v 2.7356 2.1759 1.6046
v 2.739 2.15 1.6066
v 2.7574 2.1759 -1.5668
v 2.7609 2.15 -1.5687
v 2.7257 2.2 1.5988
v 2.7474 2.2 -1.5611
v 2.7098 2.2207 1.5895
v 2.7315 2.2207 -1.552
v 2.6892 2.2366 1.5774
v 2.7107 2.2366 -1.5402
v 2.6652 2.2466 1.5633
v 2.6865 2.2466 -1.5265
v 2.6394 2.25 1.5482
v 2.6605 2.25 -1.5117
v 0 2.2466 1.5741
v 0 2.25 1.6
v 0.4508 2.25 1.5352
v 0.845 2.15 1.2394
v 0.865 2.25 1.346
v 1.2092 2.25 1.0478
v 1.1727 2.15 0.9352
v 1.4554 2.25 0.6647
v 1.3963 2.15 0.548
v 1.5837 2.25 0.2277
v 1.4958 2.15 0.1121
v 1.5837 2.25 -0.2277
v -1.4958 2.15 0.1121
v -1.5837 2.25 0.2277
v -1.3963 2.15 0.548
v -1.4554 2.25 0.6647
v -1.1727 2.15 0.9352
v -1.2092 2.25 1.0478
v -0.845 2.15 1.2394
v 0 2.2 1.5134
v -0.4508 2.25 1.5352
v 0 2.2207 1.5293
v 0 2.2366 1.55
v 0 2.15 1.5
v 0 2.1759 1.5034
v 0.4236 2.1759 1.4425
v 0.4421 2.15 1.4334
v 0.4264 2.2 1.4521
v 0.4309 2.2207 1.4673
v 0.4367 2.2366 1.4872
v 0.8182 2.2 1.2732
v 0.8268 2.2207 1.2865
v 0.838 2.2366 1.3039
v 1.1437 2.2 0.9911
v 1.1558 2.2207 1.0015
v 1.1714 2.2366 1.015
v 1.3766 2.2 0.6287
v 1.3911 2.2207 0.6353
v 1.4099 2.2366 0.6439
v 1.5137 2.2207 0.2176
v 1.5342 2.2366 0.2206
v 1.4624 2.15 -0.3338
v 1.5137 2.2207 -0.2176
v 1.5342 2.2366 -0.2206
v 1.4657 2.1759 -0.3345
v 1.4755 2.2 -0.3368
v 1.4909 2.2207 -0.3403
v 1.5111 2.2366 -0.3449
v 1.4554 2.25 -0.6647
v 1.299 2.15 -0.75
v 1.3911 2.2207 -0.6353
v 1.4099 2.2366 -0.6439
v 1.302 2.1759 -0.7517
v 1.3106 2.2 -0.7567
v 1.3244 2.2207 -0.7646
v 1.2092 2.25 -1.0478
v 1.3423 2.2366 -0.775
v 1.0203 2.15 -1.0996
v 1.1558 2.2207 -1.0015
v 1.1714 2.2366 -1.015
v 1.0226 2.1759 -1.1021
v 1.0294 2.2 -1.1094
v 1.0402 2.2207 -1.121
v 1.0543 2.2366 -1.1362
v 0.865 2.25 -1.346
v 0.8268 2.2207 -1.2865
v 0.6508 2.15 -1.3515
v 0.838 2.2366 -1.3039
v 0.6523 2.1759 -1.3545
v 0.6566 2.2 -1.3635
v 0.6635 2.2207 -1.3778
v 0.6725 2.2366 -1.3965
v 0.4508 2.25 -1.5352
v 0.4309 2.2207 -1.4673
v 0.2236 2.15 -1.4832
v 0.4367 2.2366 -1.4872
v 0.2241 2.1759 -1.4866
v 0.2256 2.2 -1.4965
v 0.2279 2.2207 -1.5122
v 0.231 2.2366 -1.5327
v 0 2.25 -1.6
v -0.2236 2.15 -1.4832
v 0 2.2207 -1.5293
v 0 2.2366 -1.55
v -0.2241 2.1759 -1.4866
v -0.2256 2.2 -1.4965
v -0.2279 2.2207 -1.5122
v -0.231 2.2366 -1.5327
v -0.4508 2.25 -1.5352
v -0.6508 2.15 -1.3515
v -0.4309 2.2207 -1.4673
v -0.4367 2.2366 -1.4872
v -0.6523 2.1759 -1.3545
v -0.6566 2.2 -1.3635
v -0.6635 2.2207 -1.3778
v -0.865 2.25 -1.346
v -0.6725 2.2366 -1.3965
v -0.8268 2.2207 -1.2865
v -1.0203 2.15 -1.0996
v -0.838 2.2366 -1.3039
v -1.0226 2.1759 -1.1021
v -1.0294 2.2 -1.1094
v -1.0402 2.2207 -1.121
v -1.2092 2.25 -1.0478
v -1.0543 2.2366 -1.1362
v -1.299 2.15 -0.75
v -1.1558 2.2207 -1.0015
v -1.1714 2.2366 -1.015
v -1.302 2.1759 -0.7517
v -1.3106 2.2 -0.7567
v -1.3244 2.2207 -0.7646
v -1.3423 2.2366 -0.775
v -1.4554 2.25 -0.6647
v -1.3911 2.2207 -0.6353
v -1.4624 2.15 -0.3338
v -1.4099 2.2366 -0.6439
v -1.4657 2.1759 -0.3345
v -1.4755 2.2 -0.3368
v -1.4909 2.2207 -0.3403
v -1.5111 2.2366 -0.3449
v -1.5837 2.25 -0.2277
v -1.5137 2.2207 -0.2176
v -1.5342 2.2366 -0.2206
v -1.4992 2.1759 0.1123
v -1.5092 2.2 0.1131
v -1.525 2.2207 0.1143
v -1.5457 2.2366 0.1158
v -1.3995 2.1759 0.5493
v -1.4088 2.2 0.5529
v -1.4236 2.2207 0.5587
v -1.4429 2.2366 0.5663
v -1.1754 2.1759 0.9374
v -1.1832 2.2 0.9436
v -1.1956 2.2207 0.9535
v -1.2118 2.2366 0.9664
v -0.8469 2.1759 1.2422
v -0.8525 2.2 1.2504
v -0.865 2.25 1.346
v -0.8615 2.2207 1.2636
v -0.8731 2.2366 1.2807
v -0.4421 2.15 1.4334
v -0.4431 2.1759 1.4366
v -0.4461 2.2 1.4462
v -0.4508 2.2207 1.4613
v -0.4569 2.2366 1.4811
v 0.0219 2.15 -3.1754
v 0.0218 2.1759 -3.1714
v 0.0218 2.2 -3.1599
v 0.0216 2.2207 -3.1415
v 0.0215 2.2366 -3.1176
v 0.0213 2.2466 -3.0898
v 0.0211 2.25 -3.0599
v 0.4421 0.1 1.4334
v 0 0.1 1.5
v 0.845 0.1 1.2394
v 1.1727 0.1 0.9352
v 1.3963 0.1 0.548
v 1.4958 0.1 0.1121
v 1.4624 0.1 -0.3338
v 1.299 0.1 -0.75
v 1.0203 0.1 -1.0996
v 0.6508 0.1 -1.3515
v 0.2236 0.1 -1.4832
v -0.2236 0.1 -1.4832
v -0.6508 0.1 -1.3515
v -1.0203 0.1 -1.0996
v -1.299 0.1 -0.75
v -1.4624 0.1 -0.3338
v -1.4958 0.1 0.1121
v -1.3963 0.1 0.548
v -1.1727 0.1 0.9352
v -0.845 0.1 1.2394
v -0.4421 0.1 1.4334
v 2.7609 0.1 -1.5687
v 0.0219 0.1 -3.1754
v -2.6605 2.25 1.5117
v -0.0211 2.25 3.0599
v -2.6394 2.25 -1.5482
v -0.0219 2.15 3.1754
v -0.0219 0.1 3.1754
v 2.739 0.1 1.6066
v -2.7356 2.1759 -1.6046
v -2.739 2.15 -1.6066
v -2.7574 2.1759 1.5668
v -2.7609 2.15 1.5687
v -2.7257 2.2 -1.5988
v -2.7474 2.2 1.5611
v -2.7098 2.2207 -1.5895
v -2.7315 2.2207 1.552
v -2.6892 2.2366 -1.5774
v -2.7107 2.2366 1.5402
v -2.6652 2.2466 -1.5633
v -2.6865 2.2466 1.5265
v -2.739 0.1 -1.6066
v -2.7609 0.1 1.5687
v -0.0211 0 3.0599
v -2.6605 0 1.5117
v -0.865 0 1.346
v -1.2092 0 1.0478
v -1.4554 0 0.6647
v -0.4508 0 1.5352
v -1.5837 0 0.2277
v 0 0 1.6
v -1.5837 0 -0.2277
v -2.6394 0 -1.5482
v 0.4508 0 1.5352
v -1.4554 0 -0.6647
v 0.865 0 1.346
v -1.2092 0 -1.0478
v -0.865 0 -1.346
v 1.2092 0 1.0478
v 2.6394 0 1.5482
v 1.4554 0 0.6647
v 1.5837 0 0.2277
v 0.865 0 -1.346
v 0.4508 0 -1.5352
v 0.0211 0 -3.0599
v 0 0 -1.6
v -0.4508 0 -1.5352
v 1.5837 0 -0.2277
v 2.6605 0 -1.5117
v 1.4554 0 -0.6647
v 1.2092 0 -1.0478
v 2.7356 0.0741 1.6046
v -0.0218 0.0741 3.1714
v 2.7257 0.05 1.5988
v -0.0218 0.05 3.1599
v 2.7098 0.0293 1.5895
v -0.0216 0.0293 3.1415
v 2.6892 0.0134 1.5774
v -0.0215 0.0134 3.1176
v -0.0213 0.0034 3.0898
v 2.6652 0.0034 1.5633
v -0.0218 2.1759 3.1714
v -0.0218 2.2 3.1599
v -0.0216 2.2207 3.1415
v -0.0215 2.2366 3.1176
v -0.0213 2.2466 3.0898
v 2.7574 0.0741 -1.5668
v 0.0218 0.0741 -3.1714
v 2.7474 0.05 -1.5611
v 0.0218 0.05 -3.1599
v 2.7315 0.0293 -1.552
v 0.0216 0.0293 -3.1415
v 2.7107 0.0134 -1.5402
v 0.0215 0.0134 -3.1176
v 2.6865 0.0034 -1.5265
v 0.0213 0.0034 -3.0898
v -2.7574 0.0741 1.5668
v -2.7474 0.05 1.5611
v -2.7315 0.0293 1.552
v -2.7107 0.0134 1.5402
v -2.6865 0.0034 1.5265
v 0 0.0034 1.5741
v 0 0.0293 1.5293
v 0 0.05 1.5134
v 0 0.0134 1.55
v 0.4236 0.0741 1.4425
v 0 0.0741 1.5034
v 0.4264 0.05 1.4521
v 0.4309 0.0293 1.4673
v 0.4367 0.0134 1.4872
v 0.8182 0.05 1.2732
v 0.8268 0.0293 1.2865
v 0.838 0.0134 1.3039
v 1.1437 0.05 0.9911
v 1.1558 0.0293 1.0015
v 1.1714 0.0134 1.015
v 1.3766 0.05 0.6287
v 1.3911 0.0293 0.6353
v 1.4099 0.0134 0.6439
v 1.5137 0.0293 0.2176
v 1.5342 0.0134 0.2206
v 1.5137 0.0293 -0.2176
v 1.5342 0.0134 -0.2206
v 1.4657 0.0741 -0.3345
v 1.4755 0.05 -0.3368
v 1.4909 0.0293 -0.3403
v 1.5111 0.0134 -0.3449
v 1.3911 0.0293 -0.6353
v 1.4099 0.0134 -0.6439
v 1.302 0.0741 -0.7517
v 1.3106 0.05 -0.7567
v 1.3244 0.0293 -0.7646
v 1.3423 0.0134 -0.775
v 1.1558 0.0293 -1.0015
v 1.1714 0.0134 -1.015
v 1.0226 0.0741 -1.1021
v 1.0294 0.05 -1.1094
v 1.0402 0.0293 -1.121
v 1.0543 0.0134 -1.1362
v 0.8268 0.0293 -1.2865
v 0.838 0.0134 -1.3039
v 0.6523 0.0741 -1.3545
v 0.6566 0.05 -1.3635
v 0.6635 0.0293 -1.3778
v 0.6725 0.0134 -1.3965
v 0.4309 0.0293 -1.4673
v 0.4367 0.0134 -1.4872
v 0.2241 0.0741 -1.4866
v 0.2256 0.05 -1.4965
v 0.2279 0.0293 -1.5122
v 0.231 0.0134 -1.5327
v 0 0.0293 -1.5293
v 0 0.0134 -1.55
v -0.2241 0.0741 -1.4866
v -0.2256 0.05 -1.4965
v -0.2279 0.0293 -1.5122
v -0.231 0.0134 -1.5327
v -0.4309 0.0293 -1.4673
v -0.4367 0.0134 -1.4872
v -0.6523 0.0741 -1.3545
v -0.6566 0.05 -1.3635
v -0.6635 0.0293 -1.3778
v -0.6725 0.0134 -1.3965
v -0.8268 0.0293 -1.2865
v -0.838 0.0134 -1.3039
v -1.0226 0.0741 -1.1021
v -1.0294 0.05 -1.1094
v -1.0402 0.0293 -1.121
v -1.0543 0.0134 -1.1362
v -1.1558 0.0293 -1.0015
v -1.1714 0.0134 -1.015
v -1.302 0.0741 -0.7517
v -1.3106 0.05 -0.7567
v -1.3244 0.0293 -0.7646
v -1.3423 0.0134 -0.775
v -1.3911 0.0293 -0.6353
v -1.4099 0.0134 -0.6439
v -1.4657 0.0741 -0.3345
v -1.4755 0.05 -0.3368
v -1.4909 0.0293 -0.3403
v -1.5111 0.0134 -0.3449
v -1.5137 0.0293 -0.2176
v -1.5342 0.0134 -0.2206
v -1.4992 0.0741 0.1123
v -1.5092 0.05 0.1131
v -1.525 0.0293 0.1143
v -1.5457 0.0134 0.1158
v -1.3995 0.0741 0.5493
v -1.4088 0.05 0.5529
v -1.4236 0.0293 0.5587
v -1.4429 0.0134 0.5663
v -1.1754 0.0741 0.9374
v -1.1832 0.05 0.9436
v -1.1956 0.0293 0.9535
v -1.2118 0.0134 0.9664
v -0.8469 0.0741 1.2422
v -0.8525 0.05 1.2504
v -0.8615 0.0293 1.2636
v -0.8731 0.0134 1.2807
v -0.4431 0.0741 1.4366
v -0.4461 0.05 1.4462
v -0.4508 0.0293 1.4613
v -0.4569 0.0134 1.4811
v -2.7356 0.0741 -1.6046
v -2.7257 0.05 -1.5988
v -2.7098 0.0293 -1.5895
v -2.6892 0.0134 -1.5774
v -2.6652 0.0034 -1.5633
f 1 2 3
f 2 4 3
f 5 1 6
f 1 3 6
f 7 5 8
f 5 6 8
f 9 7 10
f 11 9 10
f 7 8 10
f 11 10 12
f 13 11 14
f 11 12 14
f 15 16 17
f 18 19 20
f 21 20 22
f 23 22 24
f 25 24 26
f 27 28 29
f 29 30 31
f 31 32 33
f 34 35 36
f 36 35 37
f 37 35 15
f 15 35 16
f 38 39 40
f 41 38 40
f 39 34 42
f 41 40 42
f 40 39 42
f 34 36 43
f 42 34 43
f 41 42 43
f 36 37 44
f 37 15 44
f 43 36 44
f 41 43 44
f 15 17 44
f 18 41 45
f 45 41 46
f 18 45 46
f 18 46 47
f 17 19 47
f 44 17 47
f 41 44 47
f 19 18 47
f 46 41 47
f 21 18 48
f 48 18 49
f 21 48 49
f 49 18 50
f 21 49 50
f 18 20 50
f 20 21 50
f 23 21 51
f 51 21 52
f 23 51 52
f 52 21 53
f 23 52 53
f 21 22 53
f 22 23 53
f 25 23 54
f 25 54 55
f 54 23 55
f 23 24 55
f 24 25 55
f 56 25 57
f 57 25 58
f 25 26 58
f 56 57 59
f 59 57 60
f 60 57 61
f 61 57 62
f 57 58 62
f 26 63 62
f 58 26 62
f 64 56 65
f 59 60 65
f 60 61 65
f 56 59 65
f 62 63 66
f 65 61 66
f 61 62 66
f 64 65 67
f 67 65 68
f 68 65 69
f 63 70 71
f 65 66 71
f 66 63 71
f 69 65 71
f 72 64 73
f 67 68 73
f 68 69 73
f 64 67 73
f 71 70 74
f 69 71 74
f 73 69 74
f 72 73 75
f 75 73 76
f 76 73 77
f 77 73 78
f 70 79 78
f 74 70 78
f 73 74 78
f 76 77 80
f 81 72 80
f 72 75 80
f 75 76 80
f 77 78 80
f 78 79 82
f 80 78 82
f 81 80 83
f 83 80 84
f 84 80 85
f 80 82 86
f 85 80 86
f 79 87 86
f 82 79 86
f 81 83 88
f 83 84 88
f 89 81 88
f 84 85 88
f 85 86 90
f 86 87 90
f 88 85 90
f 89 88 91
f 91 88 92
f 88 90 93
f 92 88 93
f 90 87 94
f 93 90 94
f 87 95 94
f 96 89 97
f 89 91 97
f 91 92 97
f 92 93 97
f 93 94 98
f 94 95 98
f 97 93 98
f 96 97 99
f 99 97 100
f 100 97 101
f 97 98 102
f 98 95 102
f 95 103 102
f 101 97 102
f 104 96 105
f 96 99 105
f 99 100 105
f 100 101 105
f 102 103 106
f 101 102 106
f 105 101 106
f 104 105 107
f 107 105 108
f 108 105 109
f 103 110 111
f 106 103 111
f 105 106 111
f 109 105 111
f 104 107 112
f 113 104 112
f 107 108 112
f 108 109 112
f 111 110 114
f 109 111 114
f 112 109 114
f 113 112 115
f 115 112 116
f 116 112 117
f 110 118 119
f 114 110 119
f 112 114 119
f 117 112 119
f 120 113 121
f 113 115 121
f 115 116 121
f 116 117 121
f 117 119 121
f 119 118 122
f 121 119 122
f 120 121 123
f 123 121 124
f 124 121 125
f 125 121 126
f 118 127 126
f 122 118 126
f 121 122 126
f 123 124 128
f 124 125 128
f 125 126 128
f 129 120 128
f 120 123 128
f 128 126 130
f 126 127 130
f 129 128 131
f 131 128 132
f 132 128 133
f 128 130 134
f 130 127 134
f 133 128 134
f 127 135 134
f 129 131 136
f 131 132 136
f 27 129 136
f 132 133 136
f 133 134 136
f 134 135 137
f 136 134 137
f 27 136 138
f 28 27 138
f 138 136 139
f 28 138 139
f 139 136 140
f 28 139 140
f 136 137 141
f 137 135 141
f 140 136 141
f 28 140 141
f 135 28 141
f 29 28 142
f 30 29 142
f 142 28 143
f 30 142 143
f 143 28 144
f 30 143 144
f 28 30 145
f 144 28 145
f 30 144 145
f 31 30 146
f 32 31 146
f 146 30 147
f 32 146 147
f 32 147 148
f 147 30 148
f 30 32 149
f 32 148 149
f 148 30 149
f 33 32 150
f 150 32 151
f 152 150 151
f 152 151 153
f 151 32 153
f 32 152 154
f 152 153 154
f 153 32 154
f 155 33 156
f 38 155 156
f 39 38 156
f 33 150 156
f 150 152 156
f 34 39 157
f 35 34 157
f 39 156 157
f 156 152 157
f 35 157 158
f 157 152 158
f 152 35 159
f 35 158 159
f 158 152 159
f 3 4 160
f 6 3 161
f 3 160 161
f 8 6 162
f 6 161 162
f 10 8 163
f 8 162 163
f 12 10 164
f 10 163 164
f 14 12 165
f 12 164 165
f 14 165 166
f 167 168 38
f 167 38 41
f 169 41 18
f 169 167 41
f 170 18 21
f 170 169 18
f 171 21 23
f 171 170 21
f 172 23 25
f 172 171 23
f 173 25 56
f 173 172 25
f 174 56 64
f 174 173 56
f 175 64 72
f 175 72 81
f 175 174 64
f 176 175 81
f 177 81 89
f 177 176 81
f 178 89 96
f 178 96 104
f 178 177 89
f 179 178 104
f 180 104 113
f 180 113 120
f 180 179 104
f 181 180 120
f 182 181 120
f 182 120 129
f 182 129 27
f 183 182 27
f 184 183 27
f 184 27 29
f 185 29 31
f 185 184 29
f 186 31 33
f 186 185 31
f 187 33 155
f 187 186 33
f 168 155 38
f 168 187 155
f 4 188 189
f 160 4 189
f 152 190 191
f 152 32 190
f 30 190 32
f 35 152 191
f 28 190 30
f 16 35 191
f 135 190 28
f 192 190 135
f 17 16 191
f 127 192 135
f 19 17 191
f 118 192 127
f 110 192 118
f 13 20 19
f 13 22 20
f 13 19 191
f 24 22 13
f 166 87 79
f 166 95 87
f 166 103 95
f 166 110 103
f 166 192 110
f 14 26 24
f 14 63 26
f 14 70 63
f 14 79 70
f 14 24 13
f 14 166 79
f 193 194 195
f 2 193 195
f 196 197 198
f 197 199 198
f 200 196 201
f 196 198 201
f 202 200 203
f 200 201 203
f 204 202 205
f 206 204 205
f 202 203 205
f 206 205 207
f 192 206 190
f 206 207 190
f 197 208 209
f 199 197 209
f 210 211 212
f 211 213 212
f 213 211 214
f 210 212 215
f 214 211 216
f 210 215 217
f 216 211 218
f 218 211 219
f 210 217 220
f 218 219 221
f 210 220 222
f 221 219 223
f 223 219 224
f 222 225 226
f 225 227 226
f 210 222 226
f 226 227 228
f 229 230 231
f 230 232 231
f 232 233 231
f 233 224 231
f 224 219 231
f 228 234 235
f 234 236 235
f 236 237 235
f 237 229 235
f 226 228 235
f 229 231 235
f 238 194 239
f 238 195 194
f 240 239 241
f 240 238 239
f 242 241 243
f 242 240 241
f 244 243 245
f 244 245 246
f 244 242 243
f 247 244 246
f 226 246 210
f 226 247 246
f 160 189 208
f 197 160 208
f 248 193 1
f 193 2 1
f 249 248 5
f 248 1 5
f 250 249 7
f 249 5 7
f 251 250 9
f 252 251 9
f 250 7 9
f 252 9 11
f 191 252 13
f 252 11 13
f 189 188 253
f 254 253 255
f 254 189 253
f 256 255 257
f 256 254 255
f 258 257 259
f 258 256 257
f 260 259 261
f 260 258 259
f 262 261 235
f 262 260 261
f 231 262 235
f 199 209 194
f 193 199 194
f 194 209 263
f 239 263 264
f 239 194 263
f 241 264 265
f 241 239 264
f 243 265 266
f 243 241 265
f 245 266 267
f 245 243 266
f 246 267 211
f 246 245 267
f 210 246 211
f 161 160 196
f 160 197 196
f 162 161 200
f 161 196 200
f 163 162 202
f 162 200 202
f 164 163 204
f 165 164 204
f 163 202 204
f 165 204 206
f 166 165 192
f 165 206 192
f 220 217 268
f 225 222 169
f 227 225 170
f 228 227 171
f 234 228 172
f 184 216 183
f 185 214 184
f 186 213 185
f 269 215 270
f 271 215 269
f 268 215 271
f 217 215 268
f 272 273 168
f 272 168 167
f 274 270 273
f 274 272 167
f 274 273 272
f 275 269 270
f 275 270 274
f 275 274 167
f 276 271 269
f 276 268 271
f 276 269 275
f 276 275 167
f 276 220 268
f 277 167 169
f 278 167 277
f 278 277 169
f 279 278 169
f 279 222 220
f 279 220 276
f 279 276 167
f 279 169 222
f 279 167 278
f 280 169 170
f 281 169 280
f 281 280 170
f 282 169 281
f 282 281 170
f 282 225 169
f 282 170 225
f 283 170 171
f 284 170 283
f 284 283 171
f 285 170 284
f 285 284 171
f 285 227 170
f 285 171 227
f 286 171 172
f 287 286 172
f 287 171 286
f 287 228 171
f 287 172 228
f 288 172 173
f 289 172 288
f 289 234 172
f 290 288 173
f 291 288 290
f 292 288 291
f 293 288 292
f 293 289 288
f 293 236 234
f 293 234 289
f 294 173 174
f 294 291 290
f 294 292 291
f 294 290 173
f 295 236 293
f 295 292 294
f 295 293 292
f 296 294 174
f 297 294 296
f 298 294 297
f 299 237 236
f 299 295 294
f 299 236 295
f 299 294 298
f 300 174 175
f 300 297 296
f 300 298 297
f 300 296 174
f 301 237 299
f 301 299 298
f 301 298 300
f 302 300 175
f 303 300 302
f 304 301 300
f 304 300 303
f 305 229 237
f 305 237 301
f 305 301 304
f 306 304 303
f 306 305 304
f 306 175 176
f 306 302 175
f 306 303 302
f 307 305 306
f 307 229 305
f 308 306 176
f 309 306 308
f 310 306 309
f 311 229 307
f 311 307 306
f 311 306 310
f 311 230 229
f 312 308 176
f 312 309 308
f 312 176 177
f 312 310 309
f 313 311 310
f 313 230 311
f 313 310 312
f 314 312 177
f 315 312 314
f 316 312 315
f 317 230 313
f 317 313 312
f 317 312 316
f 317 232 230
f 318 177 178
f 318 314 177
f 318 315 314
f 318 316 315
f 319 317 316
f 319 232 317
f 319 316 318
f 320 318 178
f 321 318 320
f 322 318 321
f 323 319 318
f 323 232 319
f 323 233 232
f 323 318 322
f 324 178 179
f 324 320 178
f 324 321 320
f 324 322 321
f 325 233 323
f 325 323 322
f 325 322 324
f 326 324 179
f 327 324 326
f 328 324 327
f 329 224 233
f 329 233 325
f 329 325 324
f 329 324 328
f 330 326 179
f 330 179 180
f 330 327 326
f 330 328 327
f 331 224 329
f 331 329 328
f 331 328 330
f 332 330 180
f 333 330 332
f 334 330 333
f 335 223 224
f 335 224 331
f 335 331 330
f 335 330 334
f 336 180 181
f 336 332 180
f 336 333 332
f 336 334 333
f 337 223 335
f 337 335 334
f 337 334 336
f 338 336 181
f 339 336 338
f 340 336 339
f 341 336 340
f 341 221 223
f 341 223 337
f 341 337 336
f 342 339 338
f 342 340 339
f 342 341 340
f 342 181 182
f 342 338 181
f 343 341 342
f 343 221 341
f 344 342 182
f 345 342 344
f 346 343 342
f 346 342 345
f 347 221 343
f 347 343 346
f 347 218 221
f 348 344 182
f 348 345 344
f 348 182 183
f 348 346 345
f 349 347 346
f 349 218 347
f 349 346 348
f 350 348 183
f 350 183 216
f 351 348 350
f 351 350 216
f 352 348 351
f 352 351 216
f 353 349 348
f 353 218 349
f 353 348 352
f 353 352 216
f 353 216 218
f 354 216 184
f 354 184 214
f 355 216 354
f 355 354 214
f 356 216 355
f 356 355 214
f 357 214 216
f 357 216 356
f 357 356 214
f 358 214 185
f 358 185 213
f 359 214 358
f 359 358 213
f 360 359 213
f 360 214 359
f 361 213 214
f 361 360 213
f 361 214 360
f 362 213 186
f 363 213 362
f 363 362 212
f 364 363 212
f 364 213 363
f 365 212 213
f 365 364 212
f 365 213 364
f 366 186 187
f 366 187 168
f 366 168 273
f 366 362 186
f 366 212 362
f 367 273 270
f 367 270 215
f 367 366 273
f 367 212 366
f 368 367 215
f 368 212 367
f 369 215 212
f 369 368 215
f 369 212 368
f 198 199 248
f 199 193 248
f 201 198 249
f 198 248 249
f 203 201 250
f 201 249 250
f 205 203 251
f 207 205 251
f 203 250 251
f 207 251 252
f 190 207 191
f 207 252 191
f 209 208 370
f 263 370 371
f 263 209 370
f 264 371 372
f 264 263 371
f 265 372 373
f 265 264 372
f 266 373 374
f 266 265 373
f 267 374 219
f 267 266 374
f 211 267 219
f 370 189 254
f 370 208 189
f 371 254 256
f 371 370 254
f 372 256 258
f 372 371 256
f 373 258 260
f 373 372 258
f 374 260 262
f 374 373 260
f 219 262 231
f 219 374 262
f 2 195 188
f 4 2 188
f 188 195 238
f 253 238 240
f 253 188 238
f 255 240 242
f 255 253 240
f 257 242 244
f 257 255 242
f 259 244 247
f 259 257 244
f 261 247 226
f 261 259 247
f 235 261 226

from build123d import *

# Parameters (mm, degrees)
SKETCH1_R           = 1.5
BOSS_EXTRUDE1_DEPTH = 2.25
FILLET1_R           = 0.1


with BuildPart() as part:
    # Sketch1 → Boss-Extrude1 (new body)
    with BuildSketch(Plane(origin=(0, 0, 0), x_dir=(1, 0, 0), z_dir=(0, 1, 0))):
        Polygon((2.739003368, -1.606609438), (2.760866271, 1.568741778), (0.021862903, 3.175351216), (-2.739003368, 1.606609438), (-2.760866271, -1.568741778), (-0.021862903, -3.175351216), align=None)
        with Locations(Location((0, 0, 0), (0, 0, 270))):
            Circle(SKETCH1_R, mode=Mode.SUBTRACT)
    extrude(amount=BOSS_EXTRUDE1_DEPTH)

    # Fillet1
    fillet1_edges = [part.edges().sort_by_distance(p)[0] for p in [
        (1.391364587, 2.25, -2.372046497),
        (-1.358570232, 2.25, -2.390980327),
        (-2.749934819, 2.25, -0.01893383),
        (0, 0, -1.5),
        (0, 2.25, -1.5),
        (-1.391364587, 2.25, 2.372046497),
        (1.358570232, 2.25, 2.390980327),
        (-1.391364587, 0, 2.372046497),
        (-2.749934819, 0, -0.01893383),
        (-1.358570232, 0, -2.390980327),
        (2.749934819, 2.25, 0.01893383),
        (1.391364587, 0, -2.372046497),
        (2.749934819, 0, 0.01893383),
        (1.358570232, 0, 2.390980327),
    ]]
    fillet(fillet1_edges, radius=FILLET1_R)


solid = part.part
